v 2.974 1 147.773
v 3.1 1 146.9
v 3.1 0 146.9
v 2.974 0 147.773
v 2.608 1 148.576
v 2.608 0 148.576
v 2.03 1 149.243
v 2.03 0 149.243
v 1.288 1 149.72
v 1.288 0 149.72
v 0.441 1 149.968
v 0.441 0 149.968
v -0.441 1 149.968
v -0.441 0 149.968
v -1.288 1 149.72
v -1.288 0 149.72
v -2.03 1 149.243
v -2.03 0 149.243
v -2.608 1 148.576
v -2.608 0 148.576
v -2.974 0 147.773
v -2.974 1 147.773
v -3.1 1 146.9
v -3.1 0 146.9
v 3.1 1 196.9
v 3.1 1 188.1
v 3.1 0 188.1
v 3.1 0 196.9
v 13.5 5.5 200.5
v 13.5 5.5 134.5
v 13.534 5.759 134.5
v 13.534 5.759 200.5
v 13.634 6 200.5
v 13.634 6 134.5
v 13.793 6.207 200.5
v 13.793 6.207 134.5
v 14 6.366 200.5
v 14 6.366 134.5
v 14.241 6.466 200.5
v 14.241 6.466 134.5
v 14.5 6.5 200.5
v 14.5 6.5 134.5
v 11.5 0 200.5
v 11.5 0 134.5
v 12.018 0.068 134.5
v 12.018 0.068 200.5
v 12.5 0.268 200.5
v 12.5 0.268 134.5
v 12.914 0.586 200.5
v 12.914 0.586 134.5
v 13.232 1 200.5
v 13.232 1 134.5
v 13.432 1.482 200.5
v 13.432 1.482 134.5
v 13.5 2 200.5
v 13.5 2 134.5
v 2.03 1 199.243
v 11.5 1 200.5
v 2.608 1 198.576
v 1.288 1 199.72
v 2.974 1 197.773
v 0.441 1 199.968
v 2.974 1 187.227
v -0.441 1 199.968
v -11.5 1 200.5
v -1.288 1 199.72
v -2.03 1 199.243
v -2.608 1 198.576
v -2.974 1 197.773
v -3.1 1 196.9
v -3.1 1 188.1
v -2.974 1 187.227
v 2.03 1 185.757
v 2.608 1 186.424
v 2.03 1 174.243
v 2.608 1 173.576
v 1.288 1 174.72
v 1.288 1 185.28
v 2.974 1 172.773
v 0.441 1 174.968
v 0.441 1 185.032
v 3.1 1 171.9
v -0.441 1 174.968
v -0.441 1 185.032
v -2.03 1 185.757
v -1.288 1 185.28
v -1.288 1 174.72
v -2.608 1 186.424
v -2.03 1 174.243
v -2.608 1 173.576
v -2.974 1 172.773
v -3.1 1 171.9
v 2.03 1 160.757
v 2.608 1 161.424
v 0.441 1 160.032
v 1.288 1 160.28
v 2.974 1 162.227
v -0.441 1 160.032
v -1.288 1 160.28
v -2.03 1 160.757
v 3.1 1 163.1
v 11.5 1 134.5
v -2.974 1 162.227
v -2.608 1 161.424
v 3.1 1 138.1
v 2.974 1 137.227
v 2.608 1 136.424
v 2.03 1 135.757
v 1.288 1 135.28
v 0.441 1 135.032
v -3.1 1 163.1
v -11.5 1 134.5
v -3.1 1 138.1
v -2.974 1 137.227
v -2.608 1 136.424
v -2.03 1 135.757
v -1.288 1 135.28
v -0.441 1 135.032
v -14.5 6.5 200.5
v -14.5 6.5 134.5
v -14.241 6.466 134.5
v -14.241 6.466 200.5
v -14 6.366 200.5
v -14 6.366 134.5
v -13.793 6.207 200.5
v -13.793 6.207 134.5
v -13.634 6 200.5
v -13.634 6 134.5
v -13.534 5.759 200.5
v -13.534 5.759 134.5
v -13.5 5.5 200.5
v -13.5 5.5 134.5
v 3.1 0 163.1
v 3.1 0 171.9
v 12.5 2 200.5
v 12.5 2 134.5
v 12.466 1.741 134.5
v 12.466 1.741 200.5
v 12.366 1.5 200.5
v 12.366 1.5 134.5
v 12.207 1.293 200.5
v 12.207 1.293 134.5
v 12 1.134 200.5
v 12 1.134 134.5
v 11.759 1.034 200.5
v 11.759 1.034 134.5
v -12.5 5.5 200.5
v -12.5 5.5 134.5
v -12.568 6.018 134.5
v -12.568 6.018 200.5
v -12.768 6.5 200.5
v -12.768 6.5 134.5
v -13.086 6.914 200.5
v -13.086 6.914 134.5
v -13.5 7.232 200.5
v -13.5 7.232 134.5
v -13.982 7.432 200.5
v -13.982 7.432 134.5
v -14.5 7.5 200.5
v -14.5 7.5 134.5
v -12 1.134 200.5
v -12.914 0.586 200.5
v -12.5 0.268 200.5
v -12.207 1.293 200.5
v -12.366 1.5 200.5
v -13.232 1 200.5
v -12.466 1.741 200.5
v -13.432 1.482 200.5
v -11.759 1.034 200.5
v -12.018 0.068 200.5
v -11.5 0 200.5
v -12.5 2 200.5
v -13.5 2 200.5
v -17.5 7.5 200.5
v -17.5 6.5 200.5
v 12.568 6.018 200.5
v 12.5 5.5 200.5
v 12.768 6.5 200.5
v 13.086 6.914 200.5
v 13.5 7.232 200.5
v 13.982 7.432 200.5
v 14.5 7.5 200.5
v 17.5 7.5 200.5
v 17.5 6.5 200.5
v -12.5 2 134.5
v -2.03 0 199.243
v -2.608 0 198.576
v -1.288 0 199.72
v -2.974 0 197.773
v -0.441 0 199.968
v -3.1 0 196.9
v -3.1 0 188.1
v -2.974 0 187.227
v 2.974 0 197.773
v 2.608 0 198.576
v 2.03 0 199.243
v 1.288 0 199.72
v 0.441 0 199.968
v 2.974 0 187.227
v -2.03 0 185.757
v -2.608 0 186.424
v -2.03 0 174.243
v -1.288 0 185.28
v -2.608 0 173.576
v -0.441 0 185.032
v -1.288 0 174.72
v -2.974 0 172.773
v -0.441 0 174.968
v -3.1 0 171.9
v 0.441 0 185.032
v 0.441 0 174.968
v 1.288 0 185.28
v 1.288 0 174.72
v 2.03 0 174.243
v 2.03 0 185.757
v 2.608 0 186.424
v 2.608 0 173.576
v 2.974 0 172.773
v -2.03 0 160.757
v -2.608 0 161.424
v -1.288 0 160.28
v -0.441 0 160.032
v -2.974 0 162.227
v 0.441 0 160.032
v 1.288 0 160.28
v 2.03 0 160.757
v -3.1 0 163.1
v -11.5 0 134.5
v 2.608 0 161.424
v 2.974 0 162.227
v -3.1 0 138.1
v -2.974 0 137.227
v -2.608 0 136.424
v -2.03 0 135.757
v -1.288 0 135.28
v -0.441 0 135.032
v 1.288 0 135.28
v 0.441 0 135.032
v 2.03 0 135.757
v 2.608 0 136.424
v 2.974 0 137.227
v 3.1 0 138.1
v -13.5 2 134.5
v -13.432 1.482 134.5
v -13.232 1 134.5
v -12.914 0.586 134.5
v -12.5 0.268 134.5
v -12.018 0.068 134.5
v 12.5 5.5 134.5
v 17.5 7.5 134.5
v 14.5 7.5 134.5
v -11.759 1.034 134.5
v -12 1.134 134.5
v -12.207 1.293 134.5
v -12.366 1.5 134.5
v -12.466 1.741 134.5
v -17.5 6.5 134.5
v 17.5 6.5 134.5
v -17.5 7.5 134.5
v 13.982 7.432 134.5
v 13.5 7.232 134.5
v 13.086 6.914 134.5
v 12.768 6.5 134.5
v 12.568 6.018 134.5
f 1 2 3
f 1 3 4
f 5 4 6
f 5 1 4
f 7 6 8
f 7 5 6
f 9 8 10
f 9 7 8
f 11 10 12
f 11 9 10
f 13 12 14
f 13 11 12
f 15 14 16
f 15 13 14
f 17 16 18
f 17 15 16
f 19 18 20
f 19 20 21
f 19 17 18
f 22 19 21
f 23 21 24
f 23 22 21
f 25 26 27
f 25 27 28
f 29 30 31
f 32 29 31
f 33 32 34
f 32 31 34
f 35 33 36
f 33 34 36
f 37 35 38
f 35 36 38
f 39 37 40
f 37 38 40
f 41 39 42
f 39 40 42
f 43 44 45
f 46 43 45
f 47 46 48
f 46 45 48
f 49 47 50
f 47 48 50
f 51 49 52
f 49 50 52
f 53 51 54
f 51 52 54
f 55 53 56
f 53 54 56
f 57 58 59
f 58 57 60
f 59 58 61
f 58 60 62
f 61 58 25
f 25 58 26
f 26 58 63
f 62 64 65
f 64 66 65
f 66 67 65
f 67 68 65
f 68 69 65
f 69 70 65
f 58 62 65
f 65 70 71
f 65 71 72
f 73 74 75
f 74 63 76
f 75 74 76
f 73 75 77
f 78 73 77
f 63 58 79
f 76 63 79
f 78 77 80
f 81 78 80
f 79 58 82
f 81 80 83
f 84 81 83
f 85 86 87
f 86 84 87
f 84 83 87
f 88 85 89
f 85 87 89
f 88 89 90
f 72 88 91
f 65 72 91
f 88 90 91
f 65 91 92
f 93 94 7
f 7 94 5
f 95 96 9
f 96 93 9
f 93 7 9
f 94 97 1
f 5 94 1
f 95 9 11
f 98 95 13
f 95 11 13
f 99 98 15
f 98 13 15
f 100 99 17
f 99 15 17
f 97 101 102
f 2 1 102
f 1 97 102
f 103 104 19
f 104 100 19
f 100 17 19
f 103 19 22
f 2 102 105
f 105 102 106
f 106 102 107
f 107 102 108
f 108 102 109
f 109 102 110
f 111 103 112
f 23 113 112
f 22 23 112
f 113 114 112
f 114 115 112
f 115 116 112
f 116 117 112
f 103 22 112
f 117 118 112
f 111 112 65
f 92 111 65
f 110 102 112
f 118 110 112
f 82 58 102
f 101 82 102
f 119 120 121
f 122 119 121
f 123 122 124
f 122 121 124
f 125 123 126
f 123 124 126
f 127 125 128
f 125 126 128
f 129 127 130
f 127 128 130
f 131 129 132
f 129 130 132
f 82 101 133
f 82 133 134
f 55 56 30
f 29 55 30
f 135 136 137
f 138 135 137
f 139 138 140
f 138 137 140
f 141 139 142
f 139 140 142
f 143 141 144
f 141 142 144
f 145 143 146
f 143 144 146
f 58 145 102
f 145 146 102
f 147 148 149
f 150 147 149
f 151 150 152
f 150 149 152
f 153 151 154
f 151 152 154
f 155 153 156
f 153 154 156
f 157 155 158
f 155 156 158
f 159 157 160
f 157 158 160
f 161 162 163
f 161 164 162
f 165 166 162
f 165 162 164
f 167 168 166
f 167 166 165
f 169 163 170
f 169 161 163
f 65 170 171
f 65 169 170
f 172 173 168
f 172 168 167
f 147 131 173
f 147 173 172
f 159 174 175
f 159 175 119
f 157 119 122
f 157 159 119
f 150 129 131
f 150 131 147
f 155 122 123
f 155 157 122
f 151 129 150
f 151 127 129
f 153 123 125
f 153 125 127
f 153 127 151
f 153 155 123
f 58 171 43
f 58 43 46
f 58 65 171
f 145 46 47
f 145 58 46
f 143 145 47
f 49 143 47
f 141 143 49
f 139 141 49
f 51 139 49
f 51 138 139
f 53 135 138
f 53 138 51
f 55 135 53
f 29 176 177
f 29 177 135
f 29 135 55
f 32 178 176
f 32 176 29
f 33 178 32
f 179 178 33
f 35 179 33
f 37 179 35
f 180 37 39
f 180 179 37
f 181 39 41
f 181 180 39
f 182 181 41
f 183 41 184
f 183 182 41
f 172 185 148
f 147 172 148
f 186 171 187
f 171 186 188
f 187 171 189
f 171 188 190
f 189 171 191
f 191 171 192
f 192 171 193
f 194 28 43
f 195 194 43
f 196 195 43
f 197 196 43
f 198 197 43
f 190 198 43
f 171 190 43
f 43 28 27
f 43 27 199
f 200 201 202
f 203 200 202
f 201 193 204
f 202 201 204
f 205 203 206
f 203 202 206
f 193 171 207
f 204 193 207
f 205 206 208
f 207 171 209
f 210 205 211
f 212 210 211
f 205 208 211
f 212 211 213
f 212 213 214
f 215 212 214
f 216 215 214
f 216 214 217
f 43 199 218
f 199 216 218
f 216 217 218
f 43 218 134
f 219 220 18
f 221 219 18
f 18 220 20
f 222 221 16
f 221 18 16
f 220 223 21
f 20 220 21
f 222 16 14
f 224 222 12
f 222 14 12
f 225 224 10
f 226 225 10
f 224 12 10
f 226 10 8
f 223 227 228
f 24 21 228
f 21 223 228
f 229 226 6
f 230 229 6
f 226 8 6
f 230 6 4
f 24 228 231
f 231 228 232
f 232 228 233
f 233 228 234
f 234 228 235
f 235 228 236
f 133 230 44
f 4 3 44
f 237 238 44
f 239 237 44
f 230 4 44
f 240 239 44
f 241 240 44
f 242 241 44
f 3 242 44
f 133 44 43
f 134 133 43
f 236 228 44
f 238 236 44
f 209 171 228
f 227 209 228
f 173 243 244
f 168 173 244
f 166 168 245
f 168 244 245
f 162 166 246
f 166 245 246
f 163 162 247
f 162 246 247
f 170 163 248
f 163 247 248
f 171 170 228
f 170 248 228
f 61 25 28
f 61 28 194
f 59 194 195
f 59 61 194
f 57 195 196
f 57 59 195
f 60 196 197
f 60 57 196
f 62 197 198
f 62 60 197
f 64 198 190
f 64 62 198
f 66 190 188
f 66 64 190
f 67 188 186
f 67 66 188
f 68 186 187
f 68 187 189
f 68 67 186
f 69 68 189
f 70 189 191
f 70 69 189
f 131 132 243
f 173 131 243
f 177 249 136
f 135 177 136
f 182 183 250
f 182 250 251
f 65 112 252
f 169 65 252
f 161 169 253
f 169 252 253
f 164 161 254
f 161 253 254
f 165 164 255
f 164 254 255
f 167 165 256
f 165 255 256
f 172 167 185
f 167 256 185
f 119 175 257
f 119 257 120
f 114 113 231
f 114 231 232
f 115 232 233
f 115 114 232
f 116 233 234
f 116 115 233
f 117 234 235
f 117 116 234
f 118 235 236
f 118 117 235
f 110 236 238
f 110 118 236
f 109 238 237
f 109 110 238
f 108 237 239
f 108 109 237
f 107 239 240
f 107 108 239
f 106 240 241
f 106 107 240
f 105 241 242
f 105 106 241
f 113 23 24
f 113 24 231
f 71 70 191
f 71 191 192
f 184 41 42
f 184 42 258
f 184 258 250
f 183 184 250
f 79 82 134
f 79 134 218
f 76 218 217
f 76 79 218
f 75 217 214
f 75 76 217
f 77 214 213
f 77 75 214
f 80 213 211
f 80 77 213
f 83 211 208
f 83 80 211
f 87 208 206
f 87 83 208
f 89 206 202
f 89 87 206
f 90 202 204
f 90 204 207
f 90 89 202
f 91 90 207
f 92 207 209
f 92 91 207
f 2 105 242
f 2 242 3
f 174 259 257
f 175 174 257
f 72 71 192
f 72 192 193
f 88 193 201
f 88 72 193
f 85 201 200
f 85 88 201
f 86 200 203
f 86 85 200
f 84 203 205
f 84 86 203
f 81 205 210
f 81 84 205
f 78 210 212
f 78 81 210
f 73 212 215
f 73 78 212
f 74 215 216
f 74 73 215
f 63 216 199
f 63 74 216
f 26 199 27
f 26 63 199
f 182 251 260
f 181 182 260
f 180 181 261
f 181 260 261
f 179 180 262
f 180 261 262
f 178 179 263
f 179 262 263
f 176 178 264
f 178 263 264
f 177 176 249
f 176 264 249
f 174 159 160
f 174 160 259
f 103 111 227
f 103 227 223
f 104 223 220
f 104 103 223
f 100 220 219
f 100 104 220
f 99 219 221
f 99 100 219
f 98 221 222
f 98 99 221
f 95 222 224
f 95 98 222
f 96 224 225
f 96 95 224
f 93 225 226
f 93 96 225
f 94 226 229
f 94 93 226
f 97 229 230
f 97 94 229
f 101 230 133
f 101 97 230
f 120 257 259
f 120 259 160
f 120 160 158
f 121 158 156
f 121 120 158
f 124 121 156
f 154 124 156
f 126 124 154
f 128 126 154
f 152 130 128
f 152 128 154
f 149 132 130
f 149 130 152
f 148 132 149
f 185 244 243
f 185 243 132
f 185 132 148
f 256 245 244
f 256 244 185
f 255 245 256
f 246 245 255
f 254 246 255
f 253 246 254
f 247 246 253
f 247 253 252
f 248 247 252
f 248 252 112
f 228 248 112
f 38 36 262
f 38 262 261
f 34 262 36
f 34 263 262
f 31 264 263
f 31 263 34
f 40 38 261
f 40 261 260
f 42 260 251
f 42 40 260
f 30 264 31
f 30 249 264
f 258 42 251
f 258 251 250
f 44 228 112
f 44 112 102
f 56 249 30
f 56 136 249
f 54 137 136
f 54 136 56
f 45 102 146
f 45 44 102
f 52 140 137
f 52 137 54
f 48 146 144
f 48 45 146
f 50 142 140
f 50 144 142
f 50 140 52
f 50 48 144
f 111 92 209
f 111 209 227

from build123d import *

# Parameters (mm, degrees)
EXTRUDE_1_DEPTH        = 220
CUT_EXTRUDE_1_DEPTH    = 1
PATTERN_LINEAR_3_COUNT = 8
PATTERN_LINEAR_3_PITCH = 25
CUT_EXTRUDE_5_DEPTH    = 9.5
CUT_EXTRUDE_START      = -19.5
CUT_EXTRUDE_6_DEPTH    = 19.5
SKETCH_6_W             = 72.426298227
SKETCH_6_H             = 150
CUT_EXTRUDE_7_DEPTH    = 10


with BuildPart() as part:
    # Эскиз1 → Вытянуть1 (new body)
    with BuildSketch(Plane.XY):
        with BuildLine():
            Line((-17.5, 6.5), (-14.5, 6.5))
            ThreePointArc((-14.5, 6.5), (-13.792893219, 6.207106781), (-13.5, 5.5))
            Line((-13.5, 5.5), (-13.5, 2))
            ThreePointArc((-13.5, 2), (-12.914213562, 0.585786438), (-11.5, 0))
            Line((-11.5, 0), (11.5, 0))
            ThreePointArc((11.5, 0), (12.914213562, 0.585786438), (13.5, 2))
            Line((13.5, 2), (13.5, 5.5))
            ThreePointArc((13.5, 5.5), (13.792893219, 6.207106781), (14.5, 6.5))
            Line((14.5, 6.5), (17.5, 6.5))
            Line((17.5, 6.5), (17.5, 7.5))
            Line((17.5, 7.5), (14.5, 7.5))
            ThreePointArc((14.5, 7.5), (13.085786438, 6.914213562), (12.5, 5.5))
            Line((12.5, 5.5), (12.5, 2))
            ThreePointArc((12.5, 2), (12.207106781, 1.292893219), (11.5, 1))
            Line((11.5, 1), (-11.5, 1))
            ThreePointArc((-11.5, 1), (-12.207106781, 1.292893219), (-12.5, 2))
            Line((-12.5, 2), (-12.5, 5.5))
            ThreePointArc((-12.5, 5.5), (-13.085786438, 6.914213562), (-14.5, 7.5))
            Line((-14.5, 7.5), (-17.5, 7.5))
            Line((-17.5, 7.5), (-17.5, 6.5))
        make_face()
    extrude(amount=EXTRUDE_1_DEPTH)

    # Эскиз2 → Вырез-Вытянуть1 (cut)
    with BuildSketch(Plane(origin=(0, 1, 0), x_dir=(-1, 0, 0), z_dir=(0, 1, 0))):
        with BuildLine():
            Line((3.1, 21.9), (3.1, 13.1))
            ThreePointArc((3.1, 13.1), (0, 10), (-3.1, 13.1))
            Line((-3.1, 13.1), (-3.1, 21.9))
            ThreePointArc((-3.1, 21.9), (0, 25), (3.1, 21.9))
        make_face()
    cut_extrude_1 = extrude(amount=-CUT_EXTRUDE_1_DEPTH, mode=Mode.SUBTRACT)

    # Линейный массив3: Вырез-Вытянуть1 ×8
    with Locations(*[(0, 0, i * PATTERN_LINEAR_3_PITCH) for i in range(1, PATTERN_LINEAR_3_COUNT)]):
        add(cut_extrude_1, mode=Mode.SUBTRACT)

    # Эскиз3 → Вырез-Вытянуть5 (cut)
    with BuildSketch(Plane(origin=(0, 0, 0), x_dir=(-1, 0, 0), z_dir=(0, 0, -1))):
        with BuildLine():
            Line((17.5, 6.5), (17.5, 7.5))
            Line((17.5, 7.5), (14.5, 7.5))
            ThreePointArc((14.5, 7.5), (13.085786438, 6.914213562), (12.5, 5.5))
            Line((12.5, 5.5), (12.5, 2))
            ThreePointArc((12.5, 2), (12.207106781, 1.292893219), (11.5, 1))
            Line((11.5, 1), (-11.5, 1))
            ThreePointArc((-11.5, 1), (-12.207106781, 1.292893219), (-12.5, 2))
            Line((-12.5, 2), (-12.5, 5.5))
            ThreePointArc((-12.5, 5.5), (-13.085786438, 6.914213562), (-14.5, 7.5))
            Line((-14.5, 7.5), (-17.5, 7.5))
            Line((-17.5, 7.5), (-17.5, 6.5))
            Line((-17.5, 6.5), (-14.5, 6.5))
            ThreePointArc((-14.5, 6.5), (-13.792893219, 6.207106781), (-13.5, 5.5))
            Line((-13.5, 5.5), (-13.5, 2))
            ThreePointArc((-13.5, 2), (-12.914213562, 0.585786438), (-11.5, 0))
            Line((-11.5, 0), (11.5, 0))
            ThreePointArc((11.5, 0), (12.914213562, 0.585786438), (13.5, 2))
            Line((13.5, 2), (13.5, 5.5))
            ThreePointArc((13.5, 5.5), (13.792893219, 6.207106781), (14.5, 6.5))
            Line((14.5, 6.5), (17.5, 6.5))
        make_face()
    extrude(amount=-CUT_EXTRUDE_5_DEPTH, mode=Mode.SUBTRACT)

    # Эскиз5 → Вырез-Вытянуть6 (cut)
    with BuildSketch(Plane.XY.offset(220).offset(CUT_EXTRUDE_START)):
        with BuildLine():
            Line((-17.5, 7.5), (-17.5, 6.5))
            Line((-17.5, 6.5), (-14.5, 6.5))
            ThreePointArc((-14.5, 6.5), (-13.792893219, 6.207106781), (-13.5, 5.5))
            Line((-13.5, 5.5), (-13.5, 2))
            ThreePointArc((-13.5, 2), (-12.914213562, 0.585786438), (-11.5, 0))
            Line((-11.5, 0), (11.5, 0))
            ThreePointArc((11.5, 0), (12.914213562, 0.585786438), (13.5, 2))
            Line((13.5, 2), (13.5, 5.5))
            ThreePointArc((13.5, 5.5), (13.792893219, 6.207106781), (14.5, 6.5))
            Line((14.5, 6.5), (17.5, 6.5))
            Line((17.5, 6.5), (17.5, 7.5))
            Line((17.5, 7.5), (14.5, 7.5))
            ThreePointArc((14.5, 7.5), (13.085786438, 6.914213562), (12.5, 5.5))
            Line((12.5, 5.5), (12.5, 2))
            ThreePointArc((12.5, 2), (12.207106781, 1.292893219), (11.5, 1))
            Line((11.5, 1), (-11.5, 1))
            ThreePointArc((-11.5, 1), (-12.207106781, 1.292893219), (-12.5, 2))
            Line((-12.5, 2), (-12.5, 5.5))
            ThreePointArc((-12.5, 5.5), (-13.085786438, 6.914213562), (-14.5, 7.5))
            Line((-14.5, 7.5), (-17.5, 7.5))
        make_face()
    extrude(amount=CUT_EXTRUDE_6_DEPTH, mode=Mode.SUBTRACT)

    # Эскиз6 → Вырез-Вытянуть7 (cut)
    with BuildSketch(Plane.XZ):
        with Locations((4.055872701, 59.5)):
            Rectangle(SKETCH_6_W, SKETCH_6_H)
    extrude(amount=-CUT_EXTRUDE_7_DEPTH, mode=Mode.SUBTRACT)


solid = part.part
